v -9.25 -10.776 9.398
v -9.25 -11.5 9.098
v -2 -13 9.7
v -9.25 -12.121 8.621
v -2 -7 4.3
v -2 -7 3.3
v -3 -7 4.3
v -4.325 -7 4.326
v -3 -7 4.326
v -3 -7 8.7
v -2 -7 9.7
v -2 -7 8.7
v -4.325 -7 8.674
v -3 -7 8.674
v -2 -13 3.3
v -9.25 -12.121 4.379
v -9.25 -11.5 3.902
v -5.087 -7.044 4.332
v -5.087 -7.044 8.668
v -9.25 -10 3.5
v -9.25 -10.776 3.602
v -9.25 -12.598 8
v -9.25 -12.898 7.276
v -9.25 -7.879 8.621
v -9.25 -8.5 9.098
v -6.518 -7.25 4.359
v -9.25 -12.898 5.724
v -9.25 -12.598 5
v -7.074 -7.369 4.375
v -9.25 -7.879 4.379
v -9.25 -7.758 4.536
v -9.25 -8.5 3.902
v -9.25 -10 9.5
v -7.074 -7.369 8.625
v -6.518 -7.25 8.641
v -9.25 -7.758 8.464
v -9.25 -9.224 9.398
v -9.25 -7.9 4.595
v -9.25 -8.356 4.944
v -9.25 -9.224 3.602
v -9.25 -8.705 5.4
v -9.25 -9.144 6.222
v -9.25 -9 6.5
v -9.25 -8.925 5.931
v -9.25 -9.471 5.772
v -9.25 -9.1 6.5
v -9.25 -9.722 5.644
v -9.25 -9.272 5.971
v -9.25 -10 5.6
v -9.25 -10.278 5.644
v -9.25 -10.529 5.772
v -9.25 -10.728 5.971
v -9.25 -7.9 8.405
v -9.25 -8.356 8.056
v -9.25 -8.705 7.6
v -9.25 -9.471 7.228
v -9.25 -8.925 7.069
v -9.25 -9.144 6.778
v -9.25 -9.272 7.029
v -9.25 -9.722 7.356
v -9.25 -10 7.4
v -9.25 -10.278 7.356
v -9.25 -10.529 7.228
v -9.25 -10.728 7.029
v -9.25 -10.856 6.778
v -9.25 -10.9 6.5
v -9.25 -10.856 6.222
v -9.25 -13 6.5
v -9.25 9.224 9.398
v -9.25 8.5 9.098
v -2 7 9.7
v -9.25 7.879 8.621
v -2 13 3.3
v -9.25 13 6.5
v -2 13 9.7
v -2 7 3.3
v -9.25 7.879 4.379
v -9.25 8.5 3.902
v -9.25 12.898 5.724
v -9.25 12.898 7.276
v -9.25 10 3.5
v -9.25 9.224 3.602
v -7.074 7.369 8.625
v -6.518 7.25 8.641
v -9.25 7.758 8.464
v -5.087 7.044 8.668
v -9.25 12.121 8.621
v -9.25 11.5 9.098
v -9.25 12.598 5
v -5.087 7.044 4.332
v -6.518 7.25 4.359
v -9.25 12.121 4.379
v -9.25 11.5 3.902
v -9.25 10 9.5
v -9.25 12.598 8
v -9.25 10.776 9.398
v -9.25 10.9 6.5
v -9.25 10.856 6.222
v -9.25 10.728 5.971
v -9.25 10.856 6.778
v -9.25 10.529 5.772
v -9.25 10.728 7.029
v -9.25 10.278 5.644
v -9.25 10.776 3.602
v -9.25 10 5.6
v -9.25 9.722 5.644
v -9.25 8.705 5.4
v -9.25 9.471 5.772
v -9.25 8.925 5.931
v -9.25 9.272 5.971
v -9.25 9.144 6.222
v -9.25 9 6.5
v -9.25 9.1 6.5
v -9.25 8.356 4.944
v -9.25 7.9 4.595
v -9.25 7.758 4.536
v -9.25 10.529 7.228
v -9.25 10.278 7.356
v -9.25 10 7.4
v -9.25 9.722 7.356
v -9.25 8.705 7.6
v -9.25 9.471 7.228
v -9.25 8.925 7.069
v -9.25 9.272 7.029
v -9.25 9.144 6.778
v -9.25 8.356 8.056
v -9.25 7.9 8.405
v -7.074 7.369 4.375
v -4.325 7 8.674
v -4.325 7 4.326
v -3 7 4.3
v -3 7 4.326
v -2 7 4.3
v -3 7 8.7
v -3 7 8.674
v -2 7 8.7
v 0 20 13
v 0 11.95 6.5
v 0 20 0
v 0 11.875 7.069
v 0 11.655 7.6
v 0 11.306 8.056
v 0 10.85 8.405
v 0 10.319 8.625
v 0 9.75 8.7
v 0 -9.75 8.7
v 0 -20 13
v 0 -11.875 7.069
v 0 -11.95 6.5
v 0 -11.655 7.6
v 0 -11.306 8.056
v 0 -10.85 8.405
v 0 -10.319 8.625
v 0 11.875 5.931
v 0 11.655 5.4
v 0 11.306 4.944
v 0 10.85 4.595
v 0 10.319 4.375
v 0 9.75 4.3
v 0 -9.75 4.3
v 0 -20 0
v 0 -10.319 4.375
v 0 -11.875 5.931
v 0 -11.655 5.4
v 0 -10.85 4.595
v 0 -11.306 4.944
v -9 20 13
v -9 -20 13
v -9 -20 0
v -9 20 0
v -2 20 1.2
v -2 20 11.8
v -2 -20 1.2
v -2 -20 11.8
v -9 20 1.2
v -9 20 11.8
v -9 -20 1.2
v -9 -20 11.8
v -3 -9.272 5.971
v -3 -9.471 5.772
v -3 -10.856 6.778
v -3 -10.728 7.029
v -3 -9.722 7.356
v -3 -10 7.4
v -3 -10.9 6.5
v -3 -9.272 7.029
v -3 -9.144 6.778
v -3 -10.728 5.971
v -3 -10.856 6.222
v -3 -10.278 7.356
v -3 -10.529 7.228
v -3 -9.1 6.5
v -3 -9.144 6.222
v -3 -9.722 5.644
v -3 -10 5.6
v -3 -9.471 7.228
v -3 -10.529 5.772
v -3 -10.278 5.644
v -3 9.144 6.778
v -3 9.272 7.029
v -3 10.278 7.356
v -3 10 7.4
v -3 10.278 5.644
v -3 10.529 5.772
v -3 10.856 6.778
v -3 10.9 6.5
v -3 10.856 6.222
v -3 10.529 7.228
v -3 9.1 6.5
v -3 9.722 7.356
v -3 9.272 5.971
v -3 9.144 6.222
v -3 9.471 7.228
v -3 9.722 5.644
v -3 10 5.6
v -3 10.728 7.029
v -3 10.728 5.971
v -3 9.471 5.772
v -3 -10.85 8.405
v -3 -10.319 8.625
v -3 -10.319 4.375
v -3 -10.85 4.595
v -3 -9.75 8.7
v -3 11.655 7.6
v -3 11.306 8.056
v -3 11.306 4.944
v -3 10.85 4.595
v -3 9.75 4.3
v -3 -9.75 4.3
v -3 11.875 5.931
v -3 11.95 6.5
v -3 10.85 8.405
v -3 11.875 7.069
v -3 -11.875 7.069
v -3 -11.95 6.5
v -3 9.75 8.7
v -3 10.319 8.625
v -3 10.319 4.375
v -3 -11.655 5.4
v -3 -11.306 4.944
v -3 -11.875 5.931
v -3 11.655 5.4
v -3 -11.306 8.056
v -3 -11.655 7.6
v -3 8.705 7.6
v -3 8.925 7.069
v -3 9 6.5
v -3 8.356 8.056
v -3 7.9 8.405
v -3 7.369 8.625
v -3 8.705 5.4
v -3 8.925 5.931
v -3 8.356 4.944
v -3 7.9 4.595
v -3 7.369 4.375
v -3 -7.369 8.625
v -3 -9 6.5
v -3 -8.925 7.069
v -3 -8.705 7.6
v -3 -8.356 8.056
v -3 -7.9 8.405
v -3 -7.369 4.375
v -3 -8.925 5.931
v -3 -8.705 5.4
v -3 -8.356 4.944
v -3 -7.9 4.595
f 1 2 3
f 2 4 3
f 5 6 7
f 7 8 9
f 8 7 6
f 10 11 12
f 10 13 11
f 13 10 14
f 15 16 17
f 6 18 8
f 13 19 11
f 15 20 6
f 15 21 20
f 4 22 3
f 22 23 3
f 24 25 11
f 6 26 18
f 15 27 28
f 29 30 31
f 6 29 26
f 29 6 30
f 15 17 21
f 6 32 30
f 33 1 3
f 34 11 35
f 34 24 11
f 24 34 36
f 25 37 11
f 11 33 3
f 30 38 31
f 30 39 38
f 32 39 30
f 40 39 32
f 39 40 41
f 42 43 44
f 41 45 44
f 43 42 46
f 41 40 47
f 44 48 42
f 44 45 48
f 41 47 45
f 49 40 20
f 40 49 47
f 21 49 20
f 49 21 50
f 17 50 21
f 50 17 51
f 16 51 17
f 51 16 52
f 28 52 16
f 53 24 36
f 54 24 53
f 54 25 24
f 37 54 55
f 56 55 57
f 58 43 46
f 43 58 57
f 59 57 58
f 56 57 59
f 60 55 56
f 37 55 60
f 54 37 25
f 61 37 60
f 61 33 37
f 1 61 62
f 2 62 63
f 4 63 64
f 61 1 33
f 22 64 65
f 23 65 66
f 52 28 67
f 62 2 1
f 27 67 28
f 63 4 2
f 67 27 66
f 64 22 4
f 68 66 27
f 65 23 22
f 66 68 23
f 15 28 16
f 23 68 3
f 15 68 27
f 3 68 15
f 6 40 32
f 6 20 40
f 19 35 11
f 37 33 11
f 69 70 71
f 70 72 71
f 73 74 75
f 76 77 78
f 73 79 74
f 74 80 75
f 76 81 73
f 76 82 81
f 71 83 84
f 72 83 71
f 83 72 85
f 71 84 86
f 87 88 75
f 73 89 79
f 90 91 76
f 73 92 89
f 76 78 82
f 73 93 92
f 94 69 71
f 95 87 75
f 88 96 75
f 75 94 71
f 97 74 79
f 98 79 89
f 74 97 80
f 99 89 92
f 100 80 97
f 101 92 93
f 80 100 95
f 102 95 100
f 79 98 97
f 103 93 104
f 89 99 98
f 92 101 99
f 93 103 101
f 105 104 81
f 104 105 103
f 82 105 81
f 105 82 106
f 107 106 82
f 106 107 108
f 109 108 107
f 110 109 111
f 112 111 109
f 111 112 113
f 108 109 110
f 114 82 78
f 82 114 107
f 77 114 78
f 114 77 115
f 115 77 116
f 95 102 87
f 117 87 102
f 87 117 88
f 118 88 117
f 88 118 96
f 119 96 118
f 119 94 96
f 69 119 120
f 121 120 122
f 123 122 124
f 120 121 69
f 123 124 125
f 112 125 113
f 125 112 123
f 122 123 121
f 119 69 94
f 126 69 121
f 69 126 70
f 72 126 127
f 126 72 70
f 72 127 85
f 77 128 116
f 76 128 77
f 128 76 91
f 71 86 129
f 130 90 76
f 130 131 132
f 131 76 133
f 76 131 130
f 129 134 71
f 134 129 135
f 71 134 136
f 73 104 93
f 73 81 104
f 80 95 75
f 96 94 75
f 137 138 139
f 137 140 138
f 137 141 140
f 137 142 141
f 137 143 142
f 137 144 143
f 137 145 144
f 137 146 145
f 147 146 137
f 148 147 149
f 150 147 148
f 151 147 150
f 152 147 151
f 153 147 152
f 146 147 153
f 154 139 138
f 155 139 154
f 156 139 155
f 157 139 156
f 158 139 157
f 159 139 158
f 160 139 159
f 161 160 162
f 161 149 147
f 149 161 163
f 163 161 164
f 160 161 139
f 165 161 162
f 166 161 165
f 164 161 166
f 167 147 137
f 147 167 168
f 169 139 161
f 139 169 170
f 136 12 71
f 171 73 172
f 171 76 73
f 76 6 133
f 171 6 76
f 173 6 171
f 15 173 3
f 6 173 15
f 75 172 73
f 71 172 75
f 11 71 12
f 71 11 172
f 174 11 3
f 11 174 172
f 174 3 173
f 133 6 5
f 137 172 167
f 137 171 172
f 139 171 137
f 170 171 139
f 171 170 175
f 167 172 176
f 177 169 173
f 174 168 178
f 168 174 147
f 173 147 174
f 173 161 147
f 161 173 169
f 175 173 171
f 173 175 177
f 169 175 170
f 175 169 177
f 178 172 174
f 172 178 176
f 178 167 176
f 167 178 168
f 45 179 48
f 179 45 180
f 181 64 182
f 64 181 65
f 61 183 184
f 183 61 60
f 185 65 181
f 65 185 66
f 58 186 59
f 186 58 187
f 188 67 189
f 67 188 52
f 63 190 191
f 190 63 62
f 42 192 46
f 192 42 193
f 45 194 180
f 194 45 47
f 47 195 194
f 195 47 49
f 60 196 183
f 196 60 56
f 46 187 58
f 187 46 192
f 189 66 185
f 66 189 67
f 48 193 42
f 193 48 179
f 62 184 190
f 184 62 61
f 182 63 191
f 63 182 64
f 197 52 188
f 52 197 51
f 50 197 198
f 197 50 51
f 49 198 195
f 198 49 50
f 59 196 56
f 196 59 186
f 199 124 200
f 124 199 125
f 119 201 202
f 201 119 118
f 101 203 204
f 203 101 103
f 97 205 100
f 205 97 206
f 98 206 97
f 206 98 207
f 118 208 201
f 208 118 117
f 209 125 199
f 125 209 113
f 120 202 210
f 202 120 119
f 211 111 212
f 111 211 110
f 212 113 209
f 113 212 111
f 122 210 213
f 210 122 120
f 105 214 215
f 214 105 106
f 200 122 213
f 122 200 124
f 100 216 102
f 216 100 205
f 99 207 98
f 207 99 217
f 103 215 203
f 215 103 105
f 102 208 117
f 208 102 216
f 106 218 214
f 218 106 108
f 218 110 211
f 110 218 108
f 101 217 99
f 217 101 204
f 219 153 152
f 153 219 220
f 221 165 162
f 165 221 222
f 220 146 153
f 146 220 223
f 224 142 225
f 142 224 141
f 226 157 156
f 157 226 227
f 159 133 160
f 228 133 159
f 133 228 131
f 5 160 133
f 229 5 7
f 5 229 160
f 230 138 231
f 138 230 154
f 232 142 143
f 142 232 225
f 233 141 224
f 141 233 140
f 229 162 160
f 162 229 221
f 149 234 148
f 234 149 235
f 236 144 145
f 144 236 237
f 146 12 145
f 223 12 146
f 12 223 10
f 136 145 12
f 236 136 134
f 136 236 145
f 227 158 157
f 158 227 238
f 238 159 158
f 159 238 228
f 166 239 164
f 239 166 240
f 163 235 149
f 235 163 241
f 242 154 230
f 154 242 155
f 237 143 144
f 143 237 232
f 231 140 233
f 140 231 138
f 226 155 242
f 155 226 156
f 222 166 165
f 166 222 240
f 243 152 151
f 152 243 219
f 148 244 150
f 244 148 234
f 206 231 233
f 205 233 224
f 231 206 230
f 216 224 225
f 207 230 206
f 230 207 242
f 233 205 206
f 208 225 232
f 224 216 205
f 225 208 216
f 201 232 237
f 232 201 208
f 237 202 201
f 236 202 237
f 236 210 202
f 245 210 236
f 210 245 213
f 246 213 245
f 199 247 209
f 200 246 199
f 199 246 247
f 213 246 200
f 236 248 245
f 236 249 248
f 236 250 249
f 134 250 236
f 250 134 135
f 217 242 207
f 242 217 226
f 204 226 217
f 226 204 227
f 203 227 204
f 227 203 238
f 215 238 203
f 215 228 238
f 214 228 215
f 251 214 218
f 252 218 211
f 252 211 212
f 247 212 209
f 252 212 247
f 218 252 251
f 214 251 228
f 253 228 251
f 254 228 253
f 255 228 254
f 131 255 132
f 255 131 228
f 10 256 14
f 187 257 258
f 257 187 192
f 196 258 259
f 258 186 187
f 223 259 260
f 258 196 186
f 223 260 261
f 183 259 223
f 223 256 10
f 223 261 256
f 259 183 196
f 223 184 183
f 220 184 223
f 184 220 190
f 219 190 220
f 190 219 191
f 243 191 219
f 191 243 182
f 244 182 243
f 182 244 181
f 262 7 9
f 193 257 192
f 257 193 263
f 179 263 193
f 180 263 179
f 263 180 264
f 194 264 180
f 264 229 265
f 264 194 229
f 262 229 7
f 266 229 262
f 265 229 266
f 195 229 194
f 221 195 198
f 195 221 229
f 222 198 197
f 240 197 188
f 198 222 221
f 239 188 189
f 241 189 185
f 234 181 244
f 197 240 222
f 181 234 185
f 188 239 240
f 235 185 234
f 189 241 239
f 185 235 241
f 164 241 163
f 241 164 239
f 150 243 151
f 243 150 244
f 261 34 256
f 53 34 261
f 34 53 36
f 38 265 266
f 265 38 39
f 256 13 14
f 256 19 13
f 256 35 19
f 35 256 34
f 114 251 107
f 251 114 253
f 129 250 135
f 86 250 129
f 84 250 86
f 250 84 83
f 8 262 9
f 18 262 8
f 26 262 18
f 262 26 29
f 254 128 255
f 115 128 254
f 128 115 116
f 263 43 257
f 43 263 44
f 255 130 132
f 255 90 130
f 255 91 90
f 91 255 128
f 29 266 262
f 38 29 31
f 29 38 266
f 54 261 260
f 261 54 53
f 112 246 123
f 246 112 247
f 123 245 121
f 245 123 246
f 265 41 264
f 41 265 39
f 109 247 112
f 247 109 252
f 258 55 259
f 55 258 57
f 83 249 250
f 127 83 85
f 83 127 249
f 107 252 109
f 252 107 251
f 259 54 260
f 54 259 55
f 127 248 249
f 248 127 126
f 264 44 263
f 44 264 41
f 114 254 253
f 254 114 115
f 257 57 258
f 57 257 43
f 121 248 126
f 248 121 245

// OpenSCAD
// Standalone Pogo Pin Connector Test Coupon
// Outside mount: connector drops in from outside, ears rest on bosses at -3mm depth, front face flush at 0mm.

$fn = 32;

// Exact parameters
pogo_ear_span       = 23.9; // 23.5mm nominal + 0.4mm clearance across ears
pogo_ear_pitch      = 20.0; // 20.0mm exact hole-to-hole
pogo_hole_d         = 1.8;  // 1.8mm pilot hole
pogo_hole_depth     = 7.0;  // 7mm deep into solid boss
pogo_body_w         = 18.0; // 17.5mm nominal + 0.5mm clearance
pogo_body_h         = 4.4;  // 4.0mm nominal + 0.4mm clearance
pogo_boss_depth     = 3.0;  // Boss seating plane is exactly 3.0mm deep from outside
pogo_boss_r         = 3.0;  // Radius 3.0mm (dia 6.0mm)

coupon_w = 40.0;
coupon_h = 13.0;
coupon_wall_t = 2.0;
boss_len = 6.0;

// Coordinate plane:
// X = 0.0 mm: OUTSIDE face of housing wall
// X = -2.0 mm: INSIDE face of 2.0mm housing wall
// X = -3.0 mm: Screw boss seating face (-3.0mm from outside)
// X = -9.0 mm: Back of screw boss

module rounded_stadium_slot(depth, length_y, height_z, center = true) {
    r = height_z / 2;
    linear_extrude(height = depth, center = center) {
        hull() {
            translate([0, -(length_y/2 - r)]) circle(r = r, $fn = 24);
            translate([0,  (length_y/2 - r)]) circle(r = r, $fn = 24);
        }
    }
}

module pogo_test_coupon() {
    outer_x = 0.0;
    boss_face_x = outer_x - pogo_boss_depth; // -3.0 mm
    
    difference() {
        union() {
            // 1. Main outer housing wall (40 x 13 x 2 mm from X = -2.0 to 0.0)
            translate([-coupon_wall_t / 2, 0, coupon_h / 2])
                cube([coupon_wall_t, coupon_w, coupon_h], center = true);
            
            // 2. Solid screw bosses behind the ears (extending from X = -2.0 to X = -9.0)
            for (y = [-pogo_ear_pitch/2, pogo_ear_pitch/2]) {
                hull() {
                    translate([-coupon_wall_t + 0.1, y, coupon_h / 2])
                        cube([0.2, pogo_boss_r * 2, pogo_body_h + 2.0], center = true);
                    translate([boss_face_x - boss_len, y, coupon_h / 2])
                        rotate([0, 90, 0])
                            cylinder(h = 0.5, r = pogo_boss_r, center = true, $fn = 24);
                }
            }
            
            // Stiffening top and bottom ribs
            translate([(boss_face_x - boss_len) / 2, 0, 0.6])
                cube([boss_len + pogo_boss_depth, coupon_w, 1.2], center = true);
            translate([(boss_face_x - boss_len) / 2, 0, coupon_h - 0.6])
                cube([boss_len + pogo_boss_depth, coupon_w, 1.2], center = true);
        }
        
        // --- SUBTRACTIONS (Cut from outside face X = 0) ---
        
        // 1. Full Connector & Ear Pocket (23.9 x 4.4 mm) recessed 3.0mm deep from outside (X = 0 to X = -3.0)
        translate([-pogo_boss_depth / 2 + 0.05, 0, coupon_h / 2])
            rotate([0, 90, 0])
                rounded_stadium_slot(depth = pogo_boss_depth + 0.1, length_y = pogo_ear_span, height_z = pogo_body_h, center = true);
        
        // 2. Central Body Through-Opening (18.0 x 4.4 mm) passing all the way through into inside cavity
        translate([-10.0, 0, coupon_h / 2])
            rotate([0, 90, 0])
                rounded_stadium_slot(depth = 25.0, length_y = pogo_body_w, height_z = pogo_body_h, center = true);
                
        // 3. 2x Screw Pilot Holes (1.8mm dia, 7mm deep) drilled into the bosses starting at X = -3.0mm
        for (y = [-pogo_ear_pitch/2, pogo_ear_pitch/2]) {
            translate([boss_face_x + 0.5, y, coupon_h / 2])
                rotate([0, -90, 0])
                    cylinder(h = pogo_hole_depth + 1.0, r = pogo_hole_d / 2, $fn = 20);
        }
    }
}

pogo_test_coupon();
